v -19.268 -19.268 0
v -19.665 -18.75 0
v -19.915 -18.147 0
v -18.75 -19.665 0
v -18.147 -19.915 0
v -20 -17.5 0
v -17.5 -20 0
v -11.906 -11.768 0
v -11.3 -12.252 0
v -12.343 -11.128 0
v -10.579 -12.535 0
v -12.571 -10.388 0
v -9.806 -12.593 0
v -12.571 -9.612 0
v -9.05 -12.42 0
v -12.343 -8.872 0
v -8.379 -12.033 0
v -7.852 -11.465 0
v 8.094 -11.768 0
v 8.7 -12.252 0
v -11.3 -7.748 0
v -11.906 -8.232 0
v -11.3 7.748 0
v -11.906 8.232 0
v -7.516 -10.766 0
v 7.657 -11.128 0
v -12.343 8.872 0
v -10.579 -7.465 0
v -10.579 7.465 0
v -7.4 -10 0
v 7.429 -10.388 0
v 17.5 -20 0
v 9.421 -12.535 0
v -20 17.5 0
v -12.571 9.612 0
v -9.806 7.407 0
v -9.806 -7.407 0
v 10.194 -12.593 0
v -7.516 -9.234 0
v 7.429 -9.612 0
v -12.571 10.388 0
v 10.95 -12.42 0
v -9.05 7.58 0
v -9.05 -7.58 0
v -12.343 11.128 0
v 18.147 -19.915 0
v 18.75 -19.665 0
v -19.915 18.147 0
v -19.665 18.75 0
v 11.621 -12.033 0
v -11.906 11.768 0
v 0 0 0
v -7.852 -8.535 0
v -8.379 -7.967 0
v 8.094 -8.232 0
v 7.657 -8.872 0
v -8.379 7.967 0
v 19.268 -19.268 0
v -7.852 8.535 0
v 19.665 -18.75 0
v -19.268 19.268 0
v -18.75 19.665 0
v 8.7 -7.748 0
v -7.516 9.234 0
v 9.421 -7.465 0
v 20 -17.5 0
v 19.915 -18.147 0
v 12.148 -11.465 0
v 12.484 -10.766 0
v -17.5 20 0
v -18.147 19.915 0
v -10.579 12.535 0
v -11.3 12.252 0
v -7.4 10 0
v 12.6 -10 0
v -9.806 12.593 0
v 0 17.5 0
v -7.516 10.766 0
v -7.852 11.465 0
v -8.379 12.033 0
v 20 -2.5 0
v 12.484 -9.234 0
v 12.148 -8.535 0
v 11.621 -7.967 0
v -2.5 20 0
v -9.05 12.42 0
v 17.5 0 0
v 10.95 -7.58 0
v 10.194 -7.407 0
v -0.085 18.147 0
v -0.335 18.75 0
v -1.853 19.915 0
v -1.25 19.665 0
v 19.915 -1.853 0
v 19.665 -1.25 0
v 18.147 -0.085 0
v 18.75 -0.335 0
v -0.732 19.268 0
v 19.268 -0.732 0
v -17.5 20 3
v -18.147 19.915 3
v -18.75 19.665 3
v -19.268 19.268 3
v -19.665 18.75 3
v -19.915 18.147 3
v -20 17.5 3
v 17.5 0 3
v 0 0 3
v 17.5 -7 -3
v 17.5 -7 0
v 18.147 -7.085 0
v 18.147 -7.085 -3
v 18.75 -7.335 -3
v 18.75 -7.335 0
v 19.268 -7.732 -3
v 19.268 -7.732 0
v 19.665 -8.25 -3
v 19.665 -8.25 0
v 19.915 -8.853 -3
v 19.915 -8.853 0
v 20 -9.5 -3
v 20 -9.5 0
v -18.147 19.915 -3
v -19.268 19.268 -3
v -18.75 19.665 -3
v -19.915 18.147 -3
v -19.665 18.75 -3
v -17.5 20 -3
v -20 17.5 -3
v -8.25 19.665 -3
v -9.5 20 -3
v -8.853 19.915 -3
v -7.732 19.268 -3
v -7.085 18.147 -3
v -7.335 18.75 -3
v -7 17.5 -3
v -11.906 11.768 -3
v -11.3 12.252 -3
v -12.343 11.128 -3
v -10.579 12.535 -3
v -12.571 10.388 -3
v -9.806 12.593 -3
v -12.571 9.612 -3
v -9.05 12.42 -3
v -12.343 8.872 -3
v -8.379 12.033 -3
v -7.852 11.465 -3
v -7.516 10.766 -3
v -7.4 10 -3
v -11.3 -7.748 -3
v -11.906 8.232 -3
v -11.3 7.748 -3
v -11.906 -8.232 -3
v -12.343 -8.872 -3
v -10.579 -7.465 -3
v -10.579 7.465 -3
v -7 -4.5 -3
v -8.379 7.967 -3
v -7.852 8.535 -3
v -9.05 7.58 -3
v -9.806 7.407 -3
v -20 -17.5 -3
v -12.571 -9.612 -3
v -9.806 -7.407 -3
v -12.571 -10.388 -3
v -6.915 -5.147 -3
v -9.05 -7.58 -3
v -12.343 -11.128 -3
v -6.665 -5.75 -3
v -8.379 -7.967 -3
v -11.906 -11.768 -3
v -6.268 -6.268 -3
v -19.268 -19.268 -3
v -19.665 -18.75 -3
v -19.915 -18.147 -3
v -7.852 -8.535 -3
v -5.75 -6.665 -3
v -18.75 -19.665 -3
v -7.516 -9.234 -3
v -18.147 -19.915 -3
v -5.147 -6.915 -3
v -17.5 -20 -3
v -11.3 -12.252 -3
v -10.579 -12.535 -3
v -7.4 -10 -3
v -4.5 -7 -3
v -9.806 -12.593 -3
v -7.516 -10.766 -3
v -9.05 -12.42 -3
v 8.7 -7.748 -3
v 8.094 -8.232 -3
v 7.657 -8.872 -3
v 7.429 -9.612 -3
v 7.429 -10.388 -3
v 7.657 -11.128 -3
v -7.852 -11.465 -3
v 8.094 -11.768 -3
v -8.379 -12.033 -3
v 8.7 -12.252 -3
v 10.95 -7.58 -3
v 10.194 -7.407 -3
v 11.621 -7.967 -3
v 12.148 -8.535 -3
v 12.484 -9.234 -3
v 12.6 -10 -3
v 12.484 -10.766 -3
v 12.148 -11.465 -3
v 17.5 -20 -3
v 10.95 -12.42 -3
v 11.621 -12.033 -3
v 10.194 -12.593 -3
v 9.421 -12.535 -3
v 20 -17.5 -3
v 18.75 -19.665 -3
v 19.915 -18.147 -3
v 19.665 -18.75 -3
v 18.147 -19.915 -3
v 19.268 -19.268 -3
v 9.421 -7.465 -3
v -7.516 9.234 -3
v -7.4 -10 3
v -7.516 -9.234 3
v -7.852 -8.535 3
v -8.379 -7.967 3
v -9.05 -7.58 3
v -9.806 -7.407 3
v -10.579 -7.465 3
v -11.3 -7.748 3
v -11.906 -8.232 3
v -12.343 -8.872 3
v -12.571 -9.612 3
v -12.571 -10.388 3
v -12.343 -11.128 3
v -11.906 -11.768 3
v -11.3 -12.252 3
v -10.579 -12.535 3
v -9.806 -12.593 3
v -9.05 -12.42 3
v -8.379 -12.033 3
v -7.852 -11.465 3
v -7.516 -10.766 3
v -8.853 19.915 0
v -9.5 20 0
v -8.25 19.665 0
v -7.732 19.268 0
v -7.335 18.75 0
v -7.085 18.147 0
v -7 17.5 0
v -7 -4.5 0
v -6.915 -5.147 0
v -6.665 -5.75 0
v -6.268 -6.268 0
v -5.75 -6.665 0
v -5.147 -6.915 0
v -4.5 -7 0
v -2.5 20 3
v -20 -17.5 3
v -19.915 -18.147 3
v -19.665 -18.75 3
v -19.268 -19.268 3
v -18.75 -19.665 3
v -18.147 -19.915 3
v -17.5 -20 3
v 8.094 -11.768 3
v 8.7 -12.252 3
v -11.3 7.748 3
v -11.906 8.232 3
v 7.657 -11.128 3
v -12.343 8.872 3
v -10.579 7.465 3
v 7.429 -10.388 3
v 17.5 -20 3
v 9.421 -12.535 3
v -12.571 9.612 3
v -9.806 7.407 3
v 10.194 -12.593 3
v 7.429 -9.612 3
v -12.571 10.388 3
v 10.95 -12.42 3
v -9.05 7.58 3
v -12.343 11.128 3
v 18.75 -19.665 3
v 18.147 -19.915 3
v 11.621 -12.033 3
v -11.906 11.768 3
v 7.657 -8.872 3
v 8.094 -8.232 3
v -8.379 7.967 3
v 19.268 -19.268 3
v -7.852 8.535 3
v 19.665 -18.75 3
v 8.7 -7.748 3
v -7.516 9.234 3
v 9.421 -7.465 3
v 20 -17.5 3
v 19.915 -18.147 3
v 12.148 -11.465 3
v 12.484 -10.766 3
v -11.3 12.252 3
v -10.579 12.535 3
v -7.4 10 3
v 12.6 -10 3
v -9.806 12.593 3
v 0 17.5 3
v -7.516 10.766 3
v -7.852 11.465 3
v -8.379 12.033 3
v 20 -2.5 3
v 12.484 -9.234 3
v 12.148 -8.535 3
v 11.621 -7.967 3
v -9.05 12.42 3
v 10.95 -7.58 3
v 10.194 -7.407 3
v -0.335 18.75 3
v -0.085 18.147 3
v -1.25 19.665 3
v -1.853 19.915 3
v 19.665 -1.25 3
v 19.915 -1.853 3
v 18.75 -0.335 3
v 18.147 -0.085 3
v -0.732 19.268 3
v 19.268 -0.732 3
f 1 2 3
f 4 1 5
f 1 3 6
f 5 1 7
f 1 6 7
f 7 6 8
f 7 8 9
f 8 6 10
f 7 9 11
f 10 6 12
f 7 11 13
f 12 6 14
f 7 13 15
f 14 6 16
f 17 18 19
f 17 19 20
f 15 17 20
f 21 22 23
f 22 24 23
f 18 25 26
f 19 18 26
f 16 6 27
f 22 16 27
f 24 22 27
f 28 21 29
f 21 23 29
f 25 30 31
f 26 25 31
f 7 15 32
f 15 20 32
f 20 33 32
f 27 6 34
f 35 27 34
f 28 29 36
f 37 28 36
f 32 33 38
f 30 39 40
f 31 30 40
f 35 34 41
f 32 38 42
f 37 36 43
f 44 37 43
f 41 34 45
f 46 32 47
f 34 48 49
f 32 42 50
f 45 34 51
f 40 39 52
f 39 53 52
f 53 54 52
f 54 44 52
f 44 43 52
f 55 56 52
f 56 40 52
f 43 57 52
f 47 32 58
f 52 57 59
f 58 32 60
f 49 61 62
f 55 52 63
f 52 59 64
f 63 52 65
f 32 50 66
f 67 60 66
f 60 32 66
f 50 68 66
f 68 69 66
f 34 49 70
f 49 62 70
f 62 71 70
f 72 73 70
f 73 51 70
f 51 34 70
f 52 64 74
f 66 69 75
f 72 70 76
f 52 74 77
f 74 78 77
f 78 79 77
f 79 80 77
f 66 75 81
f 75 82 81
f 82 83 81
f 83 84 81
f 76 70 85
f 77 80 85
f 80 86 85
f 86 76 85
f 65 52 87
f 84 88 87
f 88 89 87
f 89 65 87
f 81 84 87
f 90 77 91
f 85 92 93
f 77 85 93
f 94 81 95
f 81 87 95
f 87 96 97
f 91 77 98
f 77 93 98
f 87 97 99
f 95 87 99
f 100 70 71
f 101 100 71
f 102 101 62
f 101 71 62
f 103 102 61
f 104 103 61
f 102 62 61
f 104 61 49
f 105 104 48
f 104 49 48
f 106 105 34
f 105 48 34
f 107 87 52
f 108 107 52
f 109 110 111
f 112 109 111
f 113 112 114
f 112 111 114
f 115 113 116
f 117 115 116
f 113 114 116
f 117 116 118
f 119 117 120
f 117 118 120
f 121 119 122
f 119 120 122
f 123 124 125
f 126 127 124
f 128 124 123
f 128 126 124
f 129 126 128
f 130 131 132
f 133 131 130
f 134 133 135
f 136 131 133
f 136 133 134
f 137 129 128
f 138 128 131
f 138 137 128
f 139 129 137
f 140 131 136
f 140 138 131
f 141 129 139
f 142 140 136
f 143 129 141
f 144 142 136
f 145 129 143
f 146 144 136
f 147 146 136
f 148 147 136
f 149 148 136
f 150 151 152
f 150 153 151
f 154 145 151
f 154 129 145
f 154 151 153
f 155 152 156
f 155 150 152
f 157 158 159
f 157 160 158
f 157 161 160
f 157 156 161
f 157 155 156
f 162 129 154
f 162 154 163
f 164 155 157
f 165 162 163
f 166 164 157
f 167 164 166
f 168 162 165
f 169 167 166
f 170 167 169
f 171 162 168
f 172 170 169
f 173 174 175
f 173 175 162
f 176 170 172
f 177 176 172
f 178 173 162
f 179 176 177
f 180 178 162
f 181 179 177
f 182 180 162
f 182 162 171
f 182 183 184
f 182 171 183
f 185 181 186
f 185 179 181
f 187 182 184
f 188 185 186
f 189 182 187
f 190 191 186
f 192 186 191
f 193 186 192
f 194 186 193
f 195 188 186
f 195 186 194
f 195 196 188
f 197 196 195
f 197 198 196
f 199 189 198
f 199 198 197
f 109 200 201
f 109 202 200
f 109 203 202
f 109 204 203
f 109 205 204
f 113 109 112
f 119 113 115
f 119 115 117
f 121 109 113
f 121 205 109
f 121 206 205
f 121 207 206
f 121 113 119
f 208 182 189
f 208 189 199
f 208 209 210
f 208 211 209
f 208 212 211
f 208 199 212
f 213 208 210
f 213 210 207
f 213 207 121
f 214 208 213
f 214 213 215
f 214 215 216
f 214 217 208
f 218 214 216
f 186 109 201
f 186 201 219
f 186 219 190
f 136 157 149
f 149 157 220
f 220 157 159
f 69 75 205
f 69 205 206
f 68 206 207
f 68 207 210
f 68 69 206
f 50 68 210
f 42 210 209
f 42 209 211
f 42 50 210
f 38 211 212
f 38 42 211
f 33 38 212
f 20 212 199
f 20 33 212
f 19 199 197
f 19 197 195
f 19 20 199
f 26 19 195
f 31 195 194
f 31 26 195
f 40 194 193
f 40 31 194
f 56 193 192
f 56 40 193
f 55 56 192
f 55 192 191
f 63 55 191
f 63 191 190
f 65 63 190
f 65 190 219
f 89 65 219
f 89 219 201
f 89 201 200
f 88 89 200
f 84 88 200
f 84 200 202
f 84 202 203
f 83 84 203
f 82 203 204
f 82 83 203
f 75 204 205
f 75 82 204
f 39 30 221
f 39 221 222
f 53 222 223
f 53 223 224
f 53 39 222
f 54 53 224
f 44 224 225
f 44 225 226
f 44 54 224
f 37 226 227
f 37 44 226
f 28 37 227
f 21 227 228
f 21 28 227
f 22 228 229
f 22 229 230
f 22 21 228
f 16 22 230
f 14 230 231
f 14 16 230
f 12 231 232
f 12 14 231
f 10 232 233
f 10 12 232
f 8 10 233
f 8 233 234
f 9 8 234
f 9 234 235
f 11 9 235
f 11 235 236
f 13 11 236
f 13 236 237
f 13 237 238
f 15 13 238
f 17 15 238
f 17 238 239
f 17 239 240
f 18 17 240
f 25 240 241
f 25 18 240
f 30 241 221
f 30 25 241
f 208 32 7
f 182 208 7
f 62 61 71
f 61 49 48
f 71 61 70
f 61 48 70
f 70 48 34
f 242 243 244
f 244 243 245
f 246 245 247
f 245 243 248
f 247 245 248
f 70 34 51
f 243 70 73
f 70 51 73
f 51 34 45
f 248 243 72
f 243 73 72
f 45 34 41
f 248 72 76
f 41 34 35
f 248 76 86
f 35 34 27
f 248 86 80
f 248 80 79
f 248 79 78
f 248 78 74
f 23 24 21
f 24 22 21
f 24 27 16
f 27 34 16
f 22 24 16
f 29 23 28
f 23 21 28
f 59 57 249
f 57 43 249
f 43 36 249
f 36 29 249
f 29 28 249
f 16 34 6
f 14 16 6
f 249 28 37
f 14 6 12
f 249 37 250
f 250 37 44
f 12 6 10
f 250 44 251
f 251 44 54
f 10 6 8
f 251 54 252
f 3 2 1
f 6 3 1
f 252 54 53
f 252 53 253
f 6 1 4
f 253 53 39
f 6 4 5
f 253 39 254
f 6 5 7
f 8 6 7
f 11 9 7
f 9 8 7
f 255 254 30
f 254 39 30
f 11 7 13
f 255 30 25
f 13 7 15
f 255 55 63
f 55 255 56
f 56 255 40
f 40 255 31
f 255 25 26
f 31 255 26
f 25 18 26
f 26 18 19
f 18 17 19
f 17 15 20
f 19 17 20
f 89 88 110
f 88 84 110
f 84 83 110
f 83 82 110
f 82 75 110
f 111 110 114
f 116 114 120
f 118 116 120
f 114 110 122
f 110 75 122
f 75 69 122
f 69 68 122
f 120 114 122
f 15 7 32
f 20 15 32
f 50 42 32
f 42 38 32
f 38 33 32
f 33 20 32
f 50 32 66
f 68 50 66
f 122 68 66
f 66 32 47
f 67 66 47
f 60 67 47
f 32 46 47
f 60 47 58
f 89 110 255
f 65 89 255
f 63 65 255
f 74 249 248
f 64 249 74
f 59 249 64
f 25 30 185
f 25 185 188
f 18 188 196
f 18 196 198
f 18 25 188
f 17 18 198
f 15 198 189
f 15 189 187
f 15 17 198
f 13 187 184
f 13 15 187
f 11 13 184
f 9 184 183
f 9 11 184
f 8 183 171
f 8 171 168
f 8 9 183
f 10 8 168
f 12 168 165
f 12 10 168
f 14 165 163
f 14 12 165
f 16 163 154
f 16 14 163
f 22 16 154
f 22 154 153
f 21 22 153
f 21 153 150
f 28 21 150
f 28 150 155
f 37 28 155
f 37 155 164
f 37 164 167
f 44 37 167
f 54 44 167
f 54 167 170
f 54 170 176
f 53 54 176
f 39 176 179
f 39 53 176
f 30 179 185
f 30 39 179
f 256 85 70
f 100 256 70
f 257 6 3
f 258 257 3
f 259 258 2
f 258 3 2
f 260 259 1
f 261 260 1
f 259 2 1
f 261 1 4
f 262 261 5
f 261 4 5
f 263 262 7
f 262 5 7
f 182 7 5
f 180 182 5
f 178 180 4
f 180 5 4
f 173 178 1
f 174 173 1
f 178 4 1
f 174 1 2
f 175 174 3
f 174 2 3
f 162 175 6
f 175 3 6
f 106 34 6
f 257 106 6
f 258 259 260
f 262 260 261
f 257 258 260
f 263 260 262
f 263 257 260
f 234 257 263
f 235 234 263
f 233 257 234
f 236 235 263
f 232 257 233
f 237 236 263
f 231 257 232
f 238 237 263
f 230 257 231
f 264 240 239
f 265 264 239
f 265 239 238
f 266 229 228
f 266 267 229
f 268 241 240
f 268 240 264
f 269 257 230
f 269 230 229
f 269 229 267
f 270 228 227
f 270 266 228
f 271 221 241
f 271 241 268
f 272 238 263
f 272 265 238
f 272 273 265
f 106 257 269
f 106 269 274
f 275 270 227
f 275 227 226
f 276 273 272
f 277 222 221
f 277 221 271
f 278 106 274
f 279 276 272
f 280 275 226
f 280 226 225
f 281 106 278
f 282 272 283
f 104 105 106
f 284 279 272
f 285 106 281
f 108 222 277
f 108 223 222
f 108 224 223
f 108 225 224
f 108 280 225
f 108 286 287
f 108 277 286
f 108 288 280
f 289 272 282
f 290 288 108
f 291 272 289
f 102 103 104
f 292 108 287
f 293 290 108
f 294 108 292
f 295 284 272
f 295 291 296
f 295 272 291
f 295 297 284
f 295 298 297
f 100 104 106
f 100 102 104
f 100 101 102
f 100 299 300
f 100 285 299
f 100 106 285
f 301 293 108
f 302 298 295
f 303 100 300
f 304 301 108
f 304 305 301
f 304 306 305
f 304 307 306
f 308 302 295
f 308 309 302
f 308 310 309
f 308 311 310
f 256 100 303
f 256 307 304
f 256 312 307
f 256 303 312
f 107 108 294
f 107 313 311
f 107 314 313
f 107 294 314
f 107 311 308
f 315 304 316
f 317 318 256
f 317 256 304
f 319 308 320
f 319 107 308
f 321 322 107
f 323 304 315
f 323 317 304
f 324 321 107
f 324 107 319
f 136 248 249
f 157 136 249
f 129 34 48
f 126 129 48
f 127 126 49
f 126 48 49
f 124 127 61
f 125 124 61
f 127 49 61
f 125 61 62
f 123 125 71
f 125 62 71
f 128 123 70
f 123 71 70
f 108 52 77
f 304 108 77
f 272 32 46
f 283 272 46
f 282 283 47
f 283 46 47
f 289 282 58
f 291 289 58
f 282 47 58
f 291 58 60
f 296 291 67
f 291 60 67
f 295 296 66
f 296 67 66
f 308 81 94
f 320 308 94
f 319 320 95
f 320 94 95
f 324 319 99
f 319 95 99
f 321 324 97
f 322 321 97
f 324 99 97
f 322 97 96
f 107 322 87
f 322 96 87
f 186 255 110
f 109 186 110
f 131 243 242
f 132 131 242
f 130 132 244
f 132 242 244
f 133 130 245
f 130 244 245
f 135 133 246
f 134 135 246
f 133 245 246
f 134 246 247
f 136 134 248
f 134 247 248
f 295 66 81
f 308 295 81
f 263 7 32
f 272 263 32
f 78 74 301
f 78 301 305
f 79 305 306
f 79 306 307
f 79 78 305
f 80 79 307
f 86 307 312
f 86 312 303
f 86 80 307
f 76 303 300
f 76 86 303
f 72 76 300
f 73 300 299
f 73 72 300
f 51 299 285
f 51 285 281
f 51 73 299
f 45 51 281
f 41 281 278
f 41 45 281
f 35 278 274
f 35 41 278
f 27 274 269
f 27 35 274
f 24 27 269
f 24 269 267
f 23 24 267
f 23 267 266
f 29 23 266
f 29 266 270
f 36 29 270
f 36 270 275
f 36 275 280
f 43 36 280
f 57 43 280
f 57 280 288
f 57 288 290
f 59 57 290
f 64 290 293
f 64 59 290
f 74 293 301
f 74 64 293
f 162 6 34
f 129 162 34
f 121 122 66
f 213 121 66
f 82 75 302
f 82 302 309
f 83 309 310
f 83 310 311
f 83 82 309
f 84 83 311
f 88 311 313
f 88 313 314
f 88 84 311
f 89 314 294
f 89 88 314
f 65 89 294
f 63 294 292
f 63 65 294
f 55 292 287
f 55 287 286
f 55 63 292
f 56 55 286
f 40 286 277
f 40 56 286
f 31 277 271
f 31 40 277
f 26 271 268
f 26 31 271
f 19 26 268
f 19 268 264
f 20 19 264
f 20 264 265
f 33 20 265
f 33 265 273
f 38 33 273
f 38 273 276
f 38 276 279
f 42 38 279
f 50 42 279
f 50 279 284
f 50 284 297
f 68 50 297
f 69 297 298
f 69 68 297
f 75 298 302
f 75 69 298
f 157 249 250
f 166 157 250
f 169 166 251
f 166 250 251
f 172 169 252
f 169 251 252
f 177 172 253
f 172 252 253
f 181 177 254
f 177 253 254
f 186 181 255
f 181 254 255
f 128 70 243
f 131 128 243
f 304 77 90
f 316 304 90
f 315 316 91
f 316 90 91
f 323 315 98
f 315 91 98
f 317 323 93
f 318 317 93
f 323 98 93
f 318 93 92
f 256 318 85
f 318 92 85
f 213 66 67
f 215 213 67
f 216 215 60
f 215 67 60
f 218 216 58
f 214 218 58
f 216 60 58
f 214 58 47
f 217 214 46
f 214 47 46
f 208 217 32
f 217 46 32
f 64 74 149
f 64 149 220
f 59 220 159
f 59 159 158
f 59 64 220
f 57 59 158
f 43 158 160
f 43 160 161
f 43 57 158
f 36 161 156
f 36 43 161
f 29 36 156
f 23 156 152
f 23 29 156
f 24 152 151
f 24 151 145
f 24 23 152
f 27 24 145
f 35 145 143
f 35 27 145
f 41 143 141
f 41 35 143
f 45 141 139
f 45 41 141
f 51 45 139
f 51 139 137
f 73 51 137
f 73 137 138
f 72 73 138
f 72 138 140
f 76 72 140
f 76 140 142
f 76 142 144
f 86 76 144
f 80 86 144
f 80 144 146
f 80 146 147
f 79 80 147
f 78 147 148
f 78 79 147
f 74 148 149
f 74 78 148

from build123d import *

# Parameters (mm, degrees)
F0_R     = 2.6
F1_DEPTH = 3
F2_R     = 2.6
F3_DEPTH = 3


with BuildPart() as f1:
    # F0 (on Top) → F1 (new body)
    with BuildSketch(Plane.XY):
        with BuildLine():
            Line((-17.5, -20), (17.5, -20))
            ThreePointArc((17.5, -20), (19.267767, -19.267767), (20, -17.5))
            Line((20, -17.5), (20, -2.5))
            ThreePointArc((20, -2.5), (19.267767, -0.732233), (17.5, 0))
            Line((17.5, 0), (0, 0))
            Line((0, 0), (0, 17.5))
            ThreePointArc((0, 17.5), (-0.732233, 19.267767), (-2.5, 20))
            Line((-2.5, 20), (-17.5, 20))
            ThreePointArc((-17.5, 20), (-19.267767, 19.267767), (-20, 17.5))
            Line((-20, 17.5), (-20, -17.5))
            ThreePointArc((-20, -17.5), (-19.267767, -19.267767), (-17.5, -20))
        make_face()
        with Locations((-10, -10)):
            Circle(F0_R, mode=Mode.SUBTRACT)
        with Locations((10, -10)):
            Circle(F0_R, mode=Mode.SUBTRACT)
        with Locations((-10, 10)):
            Circle(F0_R, mode=Mode.SUBTRACT)
    extrude(amount=F1_DEPTH)


with BuildPart() as f3:
    # F2 (on face) → F3 (new body)
    with BuildSketch(Plane(origin=(0, 0, 0), x_dir=(1, 0, 0), z_dir=(0, 0, -1))):
        with BuildLine():
            ThreePointArc((-7, 4.5), (-6.267767, 6.267767), (-4.5, 7))
            Line((-4.5, 7), (17.5, 7))
            ThreePointArc((17.5, 7), (19.267767, 7.732233), (20, 9.5))
            Line((20, 9.5), (20, 17.5))
            ThreePointArc((20, 17.5), (19.267767, 19.267767), (17.5, 20))
            Line((17.5, 20), (-17.5, 20))
            ThreePointArc((-17.5, 20), (-19.267767, 19.267767), (-20, 17.5))
            Line((-20, 17.5), (-20, -17.5))
            ThreePointArc((-20, -17.5), (-19.267767, -19.267767), (-17.5, -20))
            Line((-17.5, -20), (-9.5, -20))
            ThreePointArc((-9.5, -20), (-7.732233, -19.267767), (-7, -17.5))
            Line((-7, -17.5), (-7, 4.5))
        make_face()
        with Locations((-10, -10)):
            Circle(F2_R, mode=Mode.SUBTRACT)
        with Locations((-10, 10)):
            Circle(F2_R, mode=Mode.SUBTRACT)
        with Locations((10, 10)):
            Circle(F2_R, mode=Mode.SUBTRACT)
    extrude(amount=F3_DEPTH)


solid = Compound([f1.part, f3.part])
